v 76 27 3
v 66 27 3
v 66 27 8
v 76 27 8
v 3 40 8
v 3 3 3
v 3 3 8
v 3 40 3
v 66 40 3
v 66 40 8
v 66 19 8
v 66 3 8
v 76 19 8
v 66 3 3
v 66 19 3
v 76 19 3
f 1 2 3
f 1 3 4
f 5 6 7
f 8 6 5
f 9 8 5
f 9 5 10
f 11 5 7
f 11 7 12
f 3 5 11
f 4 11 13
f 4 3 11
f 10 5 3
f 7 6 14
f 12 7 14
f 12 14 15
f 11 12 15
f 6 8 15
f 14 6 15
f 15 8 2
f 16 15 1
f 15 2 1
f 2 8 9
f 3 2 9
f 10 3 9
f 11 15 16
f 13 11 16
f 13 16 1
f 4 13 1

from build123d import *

# Parameters (mm, degrees)
BOX004_W     = 63
BOX004_H     = 37
BOX004_DEPTH = 5
BOX003_W     = 10
BOX003_H     = 8
BOX003_DEPTH = 5


with BuildPart() as cube004:
    # Box004 → Box004 (new body)
    with BuildSketch(Plane.XY):
        with Locations((31.5, 18.5)):
            Rectangle(BOX004_W, BOX004_H)
    extrude(amount=BOX004_DEPTH)


with BuildPart() as battery_model001:
    # Box003 → Box003 (new body)
    with BuildSketch(Plane(origin=(63, 16, 0), x_dir=(1, 0, 0), z_dir=(0, 0, 1))):
        with Locations((5, 4)):
            Rectangle(BOX003_W, BOX003_H)
    extrude(amount=BOX003_DEPTH)

    # Fusion001: union Cube004
    add(cube004.part)


with BuildPart() as battery_model001_1:
    # Fusion001 placement: moved
    add(battery_model001.part.moved(Location((3, 3, 3))))


solid = battery_model001_1.part
